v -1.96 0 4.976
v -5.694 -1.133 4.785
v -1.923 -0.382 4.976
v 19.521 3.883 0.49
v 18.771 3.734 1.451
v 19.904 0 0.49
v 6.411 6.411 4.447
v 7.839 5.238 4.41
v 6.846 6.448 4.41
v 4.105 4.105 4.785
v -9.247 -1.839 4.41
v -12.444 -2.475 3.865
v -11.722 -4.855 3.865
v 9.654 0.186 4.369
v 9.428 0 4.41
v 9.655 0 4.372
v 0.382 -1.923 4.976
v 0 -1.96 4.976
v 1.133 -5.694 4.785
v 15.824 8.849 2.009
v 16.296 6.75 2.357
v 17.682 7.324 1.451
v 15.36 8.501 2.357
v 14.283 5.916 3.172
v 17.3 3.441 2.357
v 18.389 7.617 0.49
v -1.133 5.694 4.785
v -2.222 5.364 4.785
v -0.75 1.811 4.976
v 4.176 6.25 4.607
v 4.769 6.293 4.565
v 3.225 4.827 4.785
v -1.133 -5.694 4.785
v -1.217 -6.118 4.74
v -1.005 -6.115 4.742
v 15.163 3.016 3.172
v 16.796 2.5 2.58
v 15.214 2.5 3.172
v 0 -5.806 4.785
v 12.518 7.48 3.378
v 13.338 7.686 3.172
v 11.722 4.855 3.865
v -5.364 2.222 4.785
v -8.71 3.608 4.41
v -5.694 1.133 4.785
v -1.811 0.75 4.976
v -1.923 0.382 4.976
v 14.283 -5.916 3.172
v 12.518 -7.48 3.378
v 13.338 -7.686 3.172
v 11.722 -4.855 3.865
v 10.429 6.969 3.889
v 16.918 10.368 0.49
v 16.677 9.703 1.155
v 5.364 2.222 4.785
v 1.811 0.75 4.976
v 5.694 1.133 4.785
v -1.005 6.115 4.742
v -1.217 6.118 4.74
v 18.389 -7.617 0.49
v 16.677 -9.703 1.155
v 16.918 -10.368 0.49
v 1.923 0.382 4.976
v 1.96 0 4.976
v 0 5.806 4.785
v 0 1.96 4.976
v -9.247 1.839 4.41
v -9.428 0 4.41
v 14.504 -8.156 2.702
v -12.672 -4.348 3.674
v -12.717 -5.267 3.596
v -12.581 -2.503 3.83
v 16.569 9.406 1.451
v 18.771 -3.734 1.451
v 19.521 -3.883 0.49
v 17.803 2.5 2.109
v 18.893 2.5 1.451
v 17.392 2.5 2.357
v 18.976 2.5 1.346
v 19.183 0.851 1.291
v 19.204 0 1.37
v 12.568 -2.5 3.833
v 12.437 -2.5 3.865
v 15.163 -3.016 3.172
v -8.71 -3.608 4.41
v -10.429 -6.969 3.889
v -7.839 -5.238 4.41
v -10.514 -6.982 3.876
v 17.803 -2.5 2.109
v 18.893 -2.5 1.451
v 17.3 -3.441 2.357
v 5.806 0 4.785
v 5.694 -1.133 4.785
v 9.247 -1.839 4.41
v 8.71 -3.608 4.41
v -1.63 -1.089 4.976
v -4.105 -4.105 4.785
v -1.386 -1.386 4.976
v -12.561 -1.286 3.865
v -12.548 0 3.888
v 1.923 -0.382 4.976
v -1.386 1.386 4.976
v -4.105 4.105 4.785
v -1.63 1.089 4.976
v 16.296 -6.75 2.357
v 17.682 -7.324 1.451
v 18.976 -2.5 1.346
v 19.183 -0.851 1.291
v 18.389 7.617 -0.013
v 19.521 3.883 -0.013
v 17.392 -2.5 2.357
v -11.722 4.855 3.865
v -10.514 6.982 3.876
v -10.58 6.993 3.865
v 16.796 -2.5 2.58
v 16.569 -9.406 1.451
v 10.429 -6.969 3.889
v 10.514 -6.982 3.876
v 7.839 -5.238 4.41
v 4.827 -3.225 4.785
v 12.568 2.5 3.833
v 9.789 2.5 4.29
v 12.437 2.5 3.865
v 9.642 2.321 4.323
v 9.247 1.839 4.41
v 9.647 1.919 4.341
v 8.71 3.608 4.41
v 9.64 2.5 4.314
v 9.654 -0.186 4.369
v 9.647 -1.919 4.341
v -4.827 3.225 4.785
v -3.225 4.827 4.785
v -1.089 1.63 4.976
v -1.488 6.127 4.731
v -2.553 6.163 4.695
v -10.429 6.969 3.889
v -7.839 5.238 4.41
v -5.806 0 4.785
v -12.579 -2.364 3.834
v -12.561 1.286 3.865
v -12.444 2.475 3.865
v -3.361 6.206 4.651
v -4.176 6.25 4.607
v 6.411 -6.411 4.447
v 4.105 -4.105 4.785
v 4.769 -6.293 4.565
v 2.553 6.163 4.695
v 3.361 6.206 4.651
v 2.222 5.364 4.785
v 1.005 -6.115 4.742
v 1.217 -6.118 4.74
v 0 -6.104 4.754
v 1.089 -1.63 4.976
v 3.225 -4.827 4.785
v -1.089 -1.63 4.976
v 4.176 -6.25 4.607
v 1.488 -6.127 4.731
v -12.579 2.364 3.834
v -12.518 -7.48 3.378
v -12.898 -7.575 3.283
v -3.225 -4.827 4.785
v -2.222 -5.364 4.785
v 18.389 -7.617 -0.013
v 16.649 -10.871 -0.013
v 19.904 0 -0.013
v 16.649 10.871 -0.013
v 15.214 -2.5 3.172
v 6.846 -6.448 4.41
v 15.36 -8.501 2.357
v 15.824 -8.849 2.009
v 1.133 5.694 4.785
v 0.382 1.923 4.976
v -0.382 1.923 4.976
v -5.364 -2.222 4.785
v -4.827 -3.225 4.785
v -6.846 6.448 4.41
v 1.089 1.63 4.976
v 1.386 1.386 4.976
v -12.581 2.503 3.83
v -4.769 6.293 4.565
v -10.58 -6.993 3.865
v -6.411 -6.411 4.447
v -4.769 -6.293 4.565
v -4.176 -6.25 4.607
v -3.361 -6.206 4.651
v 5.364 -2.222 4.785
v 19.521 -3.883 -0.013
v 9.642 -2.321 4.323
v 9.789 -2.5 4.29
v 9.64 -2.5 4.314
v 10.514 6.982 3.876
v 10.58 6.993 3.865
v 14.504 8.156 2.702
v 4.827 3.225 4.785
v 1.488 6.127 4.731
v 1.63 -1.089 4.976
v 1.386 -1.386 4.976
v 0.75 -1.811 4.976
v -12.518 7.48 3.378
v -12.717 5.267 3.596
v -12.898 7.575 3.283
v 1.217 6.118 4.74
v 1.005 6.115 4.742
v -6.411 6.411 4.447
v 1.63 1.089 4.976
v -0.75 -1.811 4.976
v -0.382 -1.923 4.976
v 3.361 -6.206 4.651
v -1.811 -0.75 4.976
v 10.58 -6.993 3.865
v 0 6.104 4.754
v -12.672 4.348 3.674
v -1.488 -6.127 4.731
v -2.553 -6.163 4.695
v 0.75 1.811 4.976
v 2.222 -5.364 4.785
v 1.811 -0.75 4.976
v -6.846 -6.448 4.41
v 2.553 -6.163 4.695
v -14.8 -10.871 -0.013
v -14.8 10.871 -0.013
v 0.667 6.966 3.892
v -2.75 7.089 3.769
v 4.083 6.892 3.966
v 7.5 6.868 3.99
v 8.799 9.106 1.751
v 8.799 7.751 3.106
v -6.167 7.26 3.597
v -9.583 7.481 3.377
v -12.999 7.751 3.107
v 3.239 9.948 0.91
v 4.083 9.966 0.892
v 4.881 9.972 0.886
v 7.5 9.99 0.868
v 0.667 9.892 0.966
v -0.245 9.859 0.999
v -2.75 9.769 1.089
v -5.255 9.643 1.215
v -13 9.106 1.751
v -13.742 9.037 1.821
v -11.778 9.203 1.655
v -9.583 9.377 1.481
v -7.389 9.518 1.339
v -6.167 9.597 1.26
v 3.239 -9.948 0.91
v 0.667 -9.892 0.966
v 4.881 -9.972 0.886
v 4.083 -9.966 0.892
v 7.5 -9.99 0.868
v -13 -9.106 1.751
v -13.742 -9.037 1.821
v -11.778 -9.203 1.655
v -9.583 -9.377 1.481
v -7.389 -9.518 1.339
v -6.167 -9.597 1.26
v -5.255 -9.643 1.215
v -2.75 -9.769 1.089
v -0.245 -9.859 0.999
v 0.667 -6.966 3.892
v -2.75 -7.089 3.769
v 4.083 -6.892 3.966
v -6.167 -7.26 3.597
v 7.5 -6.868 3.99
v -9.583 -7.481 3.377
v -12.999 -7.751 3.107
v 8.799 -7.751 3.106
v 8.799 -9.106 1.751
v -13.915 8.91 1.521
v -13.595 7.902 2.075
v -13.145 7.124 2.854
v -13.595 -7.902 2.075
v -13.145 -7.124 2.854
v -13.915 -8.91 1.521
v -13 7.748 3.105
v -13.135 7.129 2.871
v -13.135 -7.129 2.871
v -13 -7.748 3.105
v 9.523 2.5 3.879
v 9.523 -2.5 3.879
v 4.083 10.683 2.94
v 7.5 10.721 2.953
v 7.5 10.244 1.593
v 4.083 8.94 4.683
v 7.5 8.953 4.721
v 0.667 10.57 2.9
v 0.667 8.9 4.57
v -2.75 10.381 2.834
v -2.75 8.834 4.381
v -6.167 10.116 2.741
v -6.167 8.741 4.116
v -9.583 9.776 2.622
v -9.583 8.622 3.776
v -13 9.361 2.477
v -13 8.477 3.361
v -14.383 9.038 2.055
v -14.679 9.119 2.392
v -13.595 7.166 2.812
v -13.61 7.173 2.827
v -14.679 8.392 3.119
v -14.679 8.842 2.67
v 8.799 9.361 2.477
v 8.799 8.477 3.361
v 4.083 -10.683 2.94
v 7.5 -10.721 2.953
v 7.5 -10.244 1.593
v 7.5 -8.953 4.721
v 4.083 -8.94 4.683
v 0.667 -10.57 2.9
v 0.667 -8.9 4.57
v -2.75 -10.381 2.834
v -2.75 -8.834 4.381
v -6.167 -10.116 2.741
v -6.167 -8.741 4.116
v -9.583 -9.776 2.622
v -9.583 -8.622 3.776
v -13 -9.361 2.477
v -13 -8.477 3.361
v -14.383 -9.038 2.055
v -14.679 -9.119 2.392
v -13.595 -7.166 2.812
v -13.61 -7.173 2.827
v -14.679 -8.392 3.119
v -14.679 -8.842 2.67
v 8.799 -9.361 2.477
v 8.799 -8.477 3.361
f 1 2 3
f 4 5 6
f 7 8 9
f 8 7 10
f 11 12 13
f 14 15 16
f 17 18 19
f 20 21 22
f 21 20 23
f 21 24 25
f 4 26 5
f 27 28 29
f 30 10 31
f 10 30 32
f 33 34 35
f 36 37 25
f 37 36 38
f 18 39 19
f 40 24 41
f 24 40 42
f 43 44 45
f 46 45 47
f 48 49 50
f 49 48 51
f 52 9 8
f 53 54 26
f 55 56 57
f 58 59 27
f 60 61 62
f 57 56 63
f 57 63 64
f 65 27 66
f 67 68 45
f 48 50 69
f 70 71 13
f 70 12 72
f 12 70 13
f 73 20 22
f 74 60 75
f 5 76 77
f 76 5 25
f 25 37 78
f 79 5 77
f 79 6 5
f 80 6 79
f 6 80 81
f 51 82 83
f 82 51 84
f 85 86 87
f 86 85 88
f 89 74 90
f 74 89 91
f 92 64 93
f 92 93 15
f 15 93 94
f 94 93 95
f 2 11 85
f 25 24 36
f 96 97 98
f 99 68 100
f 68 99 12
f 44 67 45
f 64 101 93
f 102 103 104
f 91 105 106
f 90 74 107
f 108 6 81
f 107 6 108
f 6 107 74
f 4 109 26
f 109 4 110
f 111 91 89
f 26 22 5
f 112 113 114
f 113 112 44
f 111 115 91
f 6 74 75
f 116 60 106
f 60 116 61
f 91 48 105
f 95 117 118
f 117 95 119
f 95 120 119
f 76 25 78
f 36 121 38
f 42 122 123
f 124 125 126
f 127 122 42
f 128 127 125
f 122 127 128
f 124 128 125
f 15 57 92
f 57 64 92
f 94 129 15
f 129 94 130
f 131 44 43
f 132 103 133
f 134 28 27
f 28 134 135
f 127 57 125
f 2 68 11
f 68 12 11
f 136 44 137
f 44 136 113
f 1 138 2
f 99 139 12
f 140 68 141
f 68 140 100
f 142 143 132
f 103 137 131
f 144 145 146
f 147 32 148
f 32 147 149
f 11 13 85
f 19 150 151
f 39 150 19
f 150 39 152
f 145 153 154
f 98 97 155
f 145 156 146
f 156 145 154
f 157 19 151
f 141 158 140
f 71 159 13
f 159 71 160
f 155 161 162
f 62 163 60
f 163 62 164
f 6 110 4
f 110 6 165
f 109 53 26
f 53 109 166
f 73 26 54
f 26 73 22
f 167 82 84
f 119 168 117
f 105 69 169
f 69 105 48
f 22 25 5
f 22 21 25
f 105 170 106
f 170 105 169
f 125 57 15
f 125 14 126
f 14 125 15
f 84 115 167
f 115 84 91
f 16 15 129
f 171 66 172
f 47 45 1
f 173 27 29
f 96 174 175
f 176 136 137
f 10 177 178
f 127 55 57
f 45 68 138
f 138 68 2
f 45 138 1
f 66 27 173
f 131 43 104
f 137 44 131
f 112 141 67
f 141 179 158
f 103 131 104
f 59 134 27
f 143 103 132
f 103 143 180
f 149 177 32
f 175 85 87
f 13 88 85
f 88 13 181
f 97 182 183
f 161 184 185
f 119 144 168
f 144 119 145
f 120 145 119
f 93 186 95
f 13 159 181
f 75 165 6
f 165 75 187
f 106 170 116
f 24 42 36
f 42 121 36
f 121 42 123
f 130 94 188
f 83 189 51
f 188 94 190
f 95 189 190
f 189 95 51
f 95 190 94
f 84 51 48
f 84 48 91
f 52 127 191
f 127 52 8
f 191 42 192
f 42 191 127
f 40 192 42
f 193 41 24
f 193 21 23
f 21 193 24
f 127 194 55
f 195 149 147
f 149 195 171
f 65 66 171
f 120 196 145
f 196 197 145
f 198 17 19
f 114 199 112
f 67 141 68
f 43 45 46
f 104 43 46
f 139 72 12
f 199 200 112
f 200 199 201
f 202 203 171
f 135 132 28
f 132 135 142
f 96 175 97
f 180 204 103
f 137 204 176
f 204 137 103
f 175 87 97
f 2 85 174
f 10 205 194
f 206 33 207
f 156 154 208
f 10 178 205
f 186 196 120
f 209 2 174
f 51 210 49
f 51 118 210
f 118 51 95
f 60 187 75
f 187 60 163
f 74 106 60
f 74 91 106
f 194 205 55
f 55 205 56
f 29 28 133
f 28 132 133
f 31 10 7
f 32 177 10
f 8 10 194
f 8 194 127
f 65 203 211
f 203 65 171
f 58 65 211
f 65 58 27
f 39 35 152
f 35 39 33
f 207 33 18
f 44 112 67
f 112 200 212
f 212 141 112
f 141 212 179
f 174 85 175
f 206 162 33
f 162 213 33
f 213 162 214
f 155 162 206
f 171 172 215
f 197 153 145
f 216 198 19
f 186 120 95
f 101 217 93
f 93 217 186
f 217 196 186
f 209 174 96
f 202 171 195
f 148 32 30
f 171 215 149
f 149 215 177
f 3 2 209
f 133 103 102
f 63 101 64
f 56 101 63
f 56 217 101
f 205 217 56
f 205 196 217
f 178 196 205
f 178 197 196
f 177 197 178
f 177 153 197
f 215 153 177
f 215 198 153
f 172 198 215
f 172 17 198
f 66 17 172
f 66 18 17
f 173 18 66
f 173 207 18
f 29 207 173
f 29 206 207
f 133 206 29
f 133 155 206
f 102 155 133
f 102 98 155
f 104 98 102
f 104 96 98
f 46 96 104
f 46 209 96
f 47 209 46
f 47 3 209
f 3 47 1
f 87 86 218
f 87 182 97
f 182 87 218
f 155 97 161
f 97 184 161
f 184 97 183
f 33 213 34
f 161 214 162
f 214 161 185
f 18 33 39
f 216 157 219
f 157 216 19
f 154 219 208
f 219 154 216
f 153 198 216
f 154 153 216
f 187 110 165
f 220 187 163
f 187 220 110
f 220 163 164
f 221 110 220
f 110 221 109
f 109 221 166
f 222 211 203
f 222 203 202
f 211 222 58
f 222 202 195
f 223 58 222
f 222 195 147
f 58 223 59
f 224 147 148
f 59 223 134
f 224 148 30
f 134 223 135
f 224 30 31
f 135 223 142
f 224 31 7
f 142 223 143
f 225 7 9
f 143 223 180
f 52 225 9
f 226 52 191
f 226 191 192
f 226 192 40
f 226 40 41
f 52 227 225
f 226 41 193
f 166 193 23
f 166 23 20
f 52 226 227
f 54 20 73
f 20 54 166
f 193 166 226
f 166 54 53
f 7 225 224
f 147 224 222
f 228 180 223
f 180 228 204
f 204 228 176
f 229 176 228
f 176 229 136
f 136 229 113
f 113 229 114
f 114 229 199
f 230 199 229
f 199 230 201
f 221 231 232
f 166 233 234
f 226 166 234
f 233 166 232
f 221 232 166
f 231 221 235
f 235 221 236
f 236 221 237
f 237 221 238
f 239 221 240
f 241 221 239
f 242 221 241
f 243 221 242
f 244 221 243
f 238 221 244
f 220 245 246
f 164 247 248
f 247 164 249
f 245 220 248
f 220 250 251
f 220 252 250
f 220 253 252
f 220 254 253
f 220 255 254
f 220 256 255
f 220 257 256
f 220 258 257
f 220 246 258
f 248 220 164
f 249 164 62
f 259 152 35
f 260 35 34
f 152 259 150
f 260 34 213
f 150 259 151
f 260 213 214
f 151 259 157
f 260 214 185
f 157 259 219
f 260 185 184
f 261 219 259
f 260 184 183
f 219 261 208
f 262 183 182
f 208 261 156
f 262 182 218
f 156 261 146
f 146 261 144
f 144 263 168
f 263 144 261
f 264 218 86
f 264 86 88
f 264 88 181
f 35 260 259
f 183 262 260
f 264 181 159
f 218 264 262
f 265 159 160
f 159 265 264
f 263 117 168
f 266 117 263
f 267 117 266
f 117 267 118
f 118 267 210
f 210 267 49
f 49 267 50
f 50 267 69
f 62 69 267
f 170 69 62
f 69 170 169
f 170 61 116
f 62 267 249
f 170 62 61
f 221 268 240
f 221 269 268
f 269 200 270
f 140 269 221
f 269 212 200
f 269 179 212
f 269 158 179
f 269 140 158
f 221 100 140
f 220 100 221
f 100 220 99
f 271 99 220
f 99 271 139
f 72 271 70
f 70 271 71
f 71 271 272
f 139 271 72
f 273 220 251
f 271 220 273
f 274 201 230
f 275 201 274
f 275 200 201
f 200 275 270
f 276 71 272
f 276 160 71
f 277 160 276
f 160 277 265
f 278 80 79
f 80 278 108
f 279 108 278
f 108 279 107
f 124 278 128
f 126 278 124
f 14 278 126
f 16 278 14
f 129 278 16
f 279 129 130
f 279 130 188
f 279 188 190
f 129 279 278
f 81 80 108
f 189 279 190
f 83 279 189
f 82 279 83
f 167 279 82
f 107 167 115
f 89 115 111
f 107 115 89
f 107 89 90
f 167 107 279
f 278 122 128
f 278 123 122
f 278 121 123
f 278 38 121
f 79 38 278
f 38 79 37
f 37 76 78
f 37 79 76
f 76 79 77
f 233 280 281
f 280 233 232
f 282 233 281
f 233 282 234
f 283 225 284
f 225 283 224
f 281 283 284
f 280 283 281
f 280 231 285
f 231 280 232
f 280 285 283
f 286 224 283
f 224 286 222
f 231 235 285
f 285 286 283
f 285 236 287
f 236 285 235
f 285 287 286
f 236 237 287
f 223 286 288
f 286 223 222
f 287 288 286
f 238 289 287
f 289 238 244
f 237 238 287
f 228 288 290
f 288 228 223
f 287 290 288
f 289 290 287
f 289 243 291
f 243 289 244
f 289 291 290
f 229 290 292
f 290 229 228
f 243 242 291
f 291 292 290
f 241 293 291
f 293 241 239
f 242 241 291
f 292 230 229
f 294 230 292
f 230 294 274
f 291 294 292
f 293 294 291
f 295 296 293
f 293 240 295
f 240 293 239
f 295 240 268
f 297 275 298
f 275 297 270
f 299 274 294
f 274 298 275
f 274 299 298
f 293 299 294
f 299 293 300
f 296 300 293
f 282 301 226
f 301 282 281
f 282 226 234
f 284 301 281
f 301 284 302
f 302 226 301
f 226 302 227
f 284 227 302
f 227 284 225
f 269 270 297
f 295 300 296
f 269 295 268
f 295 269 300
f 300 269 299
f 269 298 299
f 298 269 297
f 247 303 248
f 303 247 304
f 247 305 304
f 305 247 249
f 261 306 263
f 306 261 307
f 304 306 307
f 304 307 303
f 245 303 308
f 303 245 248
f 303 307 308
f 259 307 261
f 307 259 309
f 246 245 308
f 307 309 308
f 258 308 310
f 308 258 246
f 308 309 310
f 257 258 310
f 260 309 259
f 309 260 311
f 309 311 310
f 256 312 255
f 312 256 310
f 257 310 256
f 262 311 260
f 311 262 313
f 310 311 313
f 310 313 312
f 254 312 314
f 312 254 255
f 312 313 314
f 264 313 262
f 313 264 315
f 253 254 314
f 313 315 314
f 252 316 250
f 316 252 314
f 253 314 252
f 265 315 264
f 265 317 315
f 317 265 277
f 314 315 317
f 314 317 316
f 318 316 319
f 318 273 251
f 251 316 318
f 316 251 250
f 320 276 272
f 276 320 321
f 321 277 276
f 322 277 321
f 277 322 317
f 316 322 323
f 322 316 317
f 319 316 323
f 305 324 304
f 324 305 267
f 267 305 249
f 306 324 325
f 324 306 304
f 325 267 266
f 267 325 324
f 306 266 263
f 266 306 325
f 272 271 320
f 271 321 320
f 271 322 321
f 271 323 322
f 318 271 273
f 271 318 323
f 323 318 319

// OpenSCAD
// file: util.scad
fn1 = 32;
fn2 = 16;

module util_half_sphere(radius, fn=fn1) {
    difference() {
        sphere(radius, $fn=fn);
        translate([0,0,-(radius+radius/19)])
            cube(2*radius+radius/10, center=true);
    }
}

function gcd(a,b) = a == b ? a : a > b ? gcd(a-b, b) : gcd(a, b-a);

module util_saucer(length, width, height, fn=fn1) {
    rad = gcd(length,gcd(width,height));
    //rad = 10;
    scale([length/(2*rad), width/(2*rad), height/rad])
        util_half_sphere(rad, fn);
}

module util_half_cylinder(length, radius, inner_fn=fn2, outer_fn=fn1) {
    maxval = max(length, 2*radius);
    intersection() {
        difference() {
            rotate([0,90,0])
                translate([0,0,-(length/2 + length/20)])
                    cylinder(length+length/10, radius, radius, $fn=inner_fn);
            
            translate([0,0,(maxval/2 + maxval/19)])
                cube(maxval+maxval/10, center=true);
        }
        
        translate([0,0,-(radius+radius/20)])
            cylinder(radius + radius/10, length/2, length/2, $fn=outer_fn);
    }
}

module util_body(length, width, height, upper_height, fn=fn1) {
    rad = gcd(length, gcd(width, upper_height));
    
    scale(.995) scale([length/(2*rad), width/(2*rad), 1])
        util_half_cylinder(2*rad, height, outer_fn=fn);
}

module util_graded_cylinder(height, radius_start, radius_end, grades=1, fn=fn1) {
    height_grade = height / grades;
    radius_grade = (radius_start - radius_end) / (grades * grades);
    for (i = [0 : 1 : grades]) {
        translate([0,0,i*height_grade])
            cylinder(height_grade, 
                     radius_start - i*radius_grade * i,
                     radius_start - (i+1) * radius_grade * (i+1),
                     $fn = fn);
    }
}

module util_nacelle(length, width, height, curved=false, up=true, front_bulge=false) {
    rad = min(width, height/2);
    grads = curved ? 6 : 1;
    scale_factor = front_bulge ? 1.1 : 1;
    direction = up ? -1 : 1;
    difference() {
        scale([1, width/ (2*rad), height/rad])
            difference() {
                union() {
                    rotate([0,-90,0])
                        rotate(30)
                            util_graded_cylinder(length-rad, rad, rad/2, grads, 6);
                    scale(scale_factor) 
                        rotate([0,90,0]) rotate(90) sphere(rad, $fn=6);
                }
                
                translate([-length/2, 0, direction * (height/2 + height/19)])
                    cube([length+length, width+width, height+height/10], center=true);
            }
        
        translate([-length-(curved?length/3:0), 0, -length/3])
            rotate([0,-45,0])
                cube(length, center=true);
    }
}

module util_mirrored(v) {
    children();
    mirror(v) children();
}

module util_ring(outer, inner, height) {
    difference() {
        translate([0,0,-height/2])
            cylinder(height, outer, outer);
        translate([0,0,-(height/2 + height/19)])
            cylinder(height+height/10, inner, inner);
    }
}

module util_star(radius, thick, num, half=false) {
    angle = 360/num;
    offset = half? angle/2 : 0;
    for (i = [0: 1: num]) {
        rotate(i* angle + offset)
            translate([radius/2,0,0])
                cube([radius, thick, thick], center=true);
    }
}

module util_ring_star(radius, thick, num, inner, half=false) {
    outer=inner+thick;
    avg = (inner + outer)/2;
    union() {
        difference() {
            util_star(radius, thick, num, half);
            cylinder(2*thick, outer, outer, $fn=num, center=true);
        }
        util_ring(outer, inner, thick);
    }
}

module util_hangar_disk(height, lower, upper, num, fn=fn1) {
    difference() {
            cylinder(height, lower, upper, $fn=fn, center=true);
        difference() {
            scale([1,1,22])
                util_star(1.1*upper, height/20, num, half=true);
            scale(.95)
                cylinder(height, lower, upper, $fn=fn, center=true);
        }
    }
}

module util_hangar_form(length, width, height, num, inner=0) {
    l = 0.6* max(length, width);
    h = 2.5* height;
    thick = min(height/20,1);
    inner = inner == 0 ? l/3 : inner;
    difference() {
        children();
        scale([1,1,h/thick]) 
            util_ring_star(l, thick, num, inner, half=true);
    }
    scale(.95) children();
}

module util_nacelle_bar(span, height, width, thickness) {
    rad = (span*span/(8*height) + height/2);
    outer = rad + thickness/2;
    inner = rad - thickness/2;
    difference(){
        translate([0,0,outer])
            rotate([0,90,0])
                util_ring(outer, inner, width);
    
        translate([0,0,1.1*outer+height])
            cube(2.2*outer, center=true);
    }
}
// main file
use <util.scad>;

module y_body() {
    difference() {
        util_saucer(40,40,5);
        y_minus();
    }
}

module y_minus() {
    translate([-35,0,5])
        rotate([0,30,0])
            cube(40, center=true);

    util_mirrored([0,1,0])
        translate([0,20,5])
            rotate([45,0,0])
                cube([40,20,20], center=true);
    
    translate([15,0,5])
        rotate([0,-75,0])
            cube([5,5,10], center=true);
}

module y_nacelle_assembly() {
    util_mirrored([0,1,0])
        translate([7.5,8,2])
            rotate([-45,0,0])
                util_nacelle(22,5,3,curved=true);
}

module y_main() {
    y_body();
    y_nacelle_assembly();
}

module yacht() {
    scale(1) y_main();
}

yacht();
